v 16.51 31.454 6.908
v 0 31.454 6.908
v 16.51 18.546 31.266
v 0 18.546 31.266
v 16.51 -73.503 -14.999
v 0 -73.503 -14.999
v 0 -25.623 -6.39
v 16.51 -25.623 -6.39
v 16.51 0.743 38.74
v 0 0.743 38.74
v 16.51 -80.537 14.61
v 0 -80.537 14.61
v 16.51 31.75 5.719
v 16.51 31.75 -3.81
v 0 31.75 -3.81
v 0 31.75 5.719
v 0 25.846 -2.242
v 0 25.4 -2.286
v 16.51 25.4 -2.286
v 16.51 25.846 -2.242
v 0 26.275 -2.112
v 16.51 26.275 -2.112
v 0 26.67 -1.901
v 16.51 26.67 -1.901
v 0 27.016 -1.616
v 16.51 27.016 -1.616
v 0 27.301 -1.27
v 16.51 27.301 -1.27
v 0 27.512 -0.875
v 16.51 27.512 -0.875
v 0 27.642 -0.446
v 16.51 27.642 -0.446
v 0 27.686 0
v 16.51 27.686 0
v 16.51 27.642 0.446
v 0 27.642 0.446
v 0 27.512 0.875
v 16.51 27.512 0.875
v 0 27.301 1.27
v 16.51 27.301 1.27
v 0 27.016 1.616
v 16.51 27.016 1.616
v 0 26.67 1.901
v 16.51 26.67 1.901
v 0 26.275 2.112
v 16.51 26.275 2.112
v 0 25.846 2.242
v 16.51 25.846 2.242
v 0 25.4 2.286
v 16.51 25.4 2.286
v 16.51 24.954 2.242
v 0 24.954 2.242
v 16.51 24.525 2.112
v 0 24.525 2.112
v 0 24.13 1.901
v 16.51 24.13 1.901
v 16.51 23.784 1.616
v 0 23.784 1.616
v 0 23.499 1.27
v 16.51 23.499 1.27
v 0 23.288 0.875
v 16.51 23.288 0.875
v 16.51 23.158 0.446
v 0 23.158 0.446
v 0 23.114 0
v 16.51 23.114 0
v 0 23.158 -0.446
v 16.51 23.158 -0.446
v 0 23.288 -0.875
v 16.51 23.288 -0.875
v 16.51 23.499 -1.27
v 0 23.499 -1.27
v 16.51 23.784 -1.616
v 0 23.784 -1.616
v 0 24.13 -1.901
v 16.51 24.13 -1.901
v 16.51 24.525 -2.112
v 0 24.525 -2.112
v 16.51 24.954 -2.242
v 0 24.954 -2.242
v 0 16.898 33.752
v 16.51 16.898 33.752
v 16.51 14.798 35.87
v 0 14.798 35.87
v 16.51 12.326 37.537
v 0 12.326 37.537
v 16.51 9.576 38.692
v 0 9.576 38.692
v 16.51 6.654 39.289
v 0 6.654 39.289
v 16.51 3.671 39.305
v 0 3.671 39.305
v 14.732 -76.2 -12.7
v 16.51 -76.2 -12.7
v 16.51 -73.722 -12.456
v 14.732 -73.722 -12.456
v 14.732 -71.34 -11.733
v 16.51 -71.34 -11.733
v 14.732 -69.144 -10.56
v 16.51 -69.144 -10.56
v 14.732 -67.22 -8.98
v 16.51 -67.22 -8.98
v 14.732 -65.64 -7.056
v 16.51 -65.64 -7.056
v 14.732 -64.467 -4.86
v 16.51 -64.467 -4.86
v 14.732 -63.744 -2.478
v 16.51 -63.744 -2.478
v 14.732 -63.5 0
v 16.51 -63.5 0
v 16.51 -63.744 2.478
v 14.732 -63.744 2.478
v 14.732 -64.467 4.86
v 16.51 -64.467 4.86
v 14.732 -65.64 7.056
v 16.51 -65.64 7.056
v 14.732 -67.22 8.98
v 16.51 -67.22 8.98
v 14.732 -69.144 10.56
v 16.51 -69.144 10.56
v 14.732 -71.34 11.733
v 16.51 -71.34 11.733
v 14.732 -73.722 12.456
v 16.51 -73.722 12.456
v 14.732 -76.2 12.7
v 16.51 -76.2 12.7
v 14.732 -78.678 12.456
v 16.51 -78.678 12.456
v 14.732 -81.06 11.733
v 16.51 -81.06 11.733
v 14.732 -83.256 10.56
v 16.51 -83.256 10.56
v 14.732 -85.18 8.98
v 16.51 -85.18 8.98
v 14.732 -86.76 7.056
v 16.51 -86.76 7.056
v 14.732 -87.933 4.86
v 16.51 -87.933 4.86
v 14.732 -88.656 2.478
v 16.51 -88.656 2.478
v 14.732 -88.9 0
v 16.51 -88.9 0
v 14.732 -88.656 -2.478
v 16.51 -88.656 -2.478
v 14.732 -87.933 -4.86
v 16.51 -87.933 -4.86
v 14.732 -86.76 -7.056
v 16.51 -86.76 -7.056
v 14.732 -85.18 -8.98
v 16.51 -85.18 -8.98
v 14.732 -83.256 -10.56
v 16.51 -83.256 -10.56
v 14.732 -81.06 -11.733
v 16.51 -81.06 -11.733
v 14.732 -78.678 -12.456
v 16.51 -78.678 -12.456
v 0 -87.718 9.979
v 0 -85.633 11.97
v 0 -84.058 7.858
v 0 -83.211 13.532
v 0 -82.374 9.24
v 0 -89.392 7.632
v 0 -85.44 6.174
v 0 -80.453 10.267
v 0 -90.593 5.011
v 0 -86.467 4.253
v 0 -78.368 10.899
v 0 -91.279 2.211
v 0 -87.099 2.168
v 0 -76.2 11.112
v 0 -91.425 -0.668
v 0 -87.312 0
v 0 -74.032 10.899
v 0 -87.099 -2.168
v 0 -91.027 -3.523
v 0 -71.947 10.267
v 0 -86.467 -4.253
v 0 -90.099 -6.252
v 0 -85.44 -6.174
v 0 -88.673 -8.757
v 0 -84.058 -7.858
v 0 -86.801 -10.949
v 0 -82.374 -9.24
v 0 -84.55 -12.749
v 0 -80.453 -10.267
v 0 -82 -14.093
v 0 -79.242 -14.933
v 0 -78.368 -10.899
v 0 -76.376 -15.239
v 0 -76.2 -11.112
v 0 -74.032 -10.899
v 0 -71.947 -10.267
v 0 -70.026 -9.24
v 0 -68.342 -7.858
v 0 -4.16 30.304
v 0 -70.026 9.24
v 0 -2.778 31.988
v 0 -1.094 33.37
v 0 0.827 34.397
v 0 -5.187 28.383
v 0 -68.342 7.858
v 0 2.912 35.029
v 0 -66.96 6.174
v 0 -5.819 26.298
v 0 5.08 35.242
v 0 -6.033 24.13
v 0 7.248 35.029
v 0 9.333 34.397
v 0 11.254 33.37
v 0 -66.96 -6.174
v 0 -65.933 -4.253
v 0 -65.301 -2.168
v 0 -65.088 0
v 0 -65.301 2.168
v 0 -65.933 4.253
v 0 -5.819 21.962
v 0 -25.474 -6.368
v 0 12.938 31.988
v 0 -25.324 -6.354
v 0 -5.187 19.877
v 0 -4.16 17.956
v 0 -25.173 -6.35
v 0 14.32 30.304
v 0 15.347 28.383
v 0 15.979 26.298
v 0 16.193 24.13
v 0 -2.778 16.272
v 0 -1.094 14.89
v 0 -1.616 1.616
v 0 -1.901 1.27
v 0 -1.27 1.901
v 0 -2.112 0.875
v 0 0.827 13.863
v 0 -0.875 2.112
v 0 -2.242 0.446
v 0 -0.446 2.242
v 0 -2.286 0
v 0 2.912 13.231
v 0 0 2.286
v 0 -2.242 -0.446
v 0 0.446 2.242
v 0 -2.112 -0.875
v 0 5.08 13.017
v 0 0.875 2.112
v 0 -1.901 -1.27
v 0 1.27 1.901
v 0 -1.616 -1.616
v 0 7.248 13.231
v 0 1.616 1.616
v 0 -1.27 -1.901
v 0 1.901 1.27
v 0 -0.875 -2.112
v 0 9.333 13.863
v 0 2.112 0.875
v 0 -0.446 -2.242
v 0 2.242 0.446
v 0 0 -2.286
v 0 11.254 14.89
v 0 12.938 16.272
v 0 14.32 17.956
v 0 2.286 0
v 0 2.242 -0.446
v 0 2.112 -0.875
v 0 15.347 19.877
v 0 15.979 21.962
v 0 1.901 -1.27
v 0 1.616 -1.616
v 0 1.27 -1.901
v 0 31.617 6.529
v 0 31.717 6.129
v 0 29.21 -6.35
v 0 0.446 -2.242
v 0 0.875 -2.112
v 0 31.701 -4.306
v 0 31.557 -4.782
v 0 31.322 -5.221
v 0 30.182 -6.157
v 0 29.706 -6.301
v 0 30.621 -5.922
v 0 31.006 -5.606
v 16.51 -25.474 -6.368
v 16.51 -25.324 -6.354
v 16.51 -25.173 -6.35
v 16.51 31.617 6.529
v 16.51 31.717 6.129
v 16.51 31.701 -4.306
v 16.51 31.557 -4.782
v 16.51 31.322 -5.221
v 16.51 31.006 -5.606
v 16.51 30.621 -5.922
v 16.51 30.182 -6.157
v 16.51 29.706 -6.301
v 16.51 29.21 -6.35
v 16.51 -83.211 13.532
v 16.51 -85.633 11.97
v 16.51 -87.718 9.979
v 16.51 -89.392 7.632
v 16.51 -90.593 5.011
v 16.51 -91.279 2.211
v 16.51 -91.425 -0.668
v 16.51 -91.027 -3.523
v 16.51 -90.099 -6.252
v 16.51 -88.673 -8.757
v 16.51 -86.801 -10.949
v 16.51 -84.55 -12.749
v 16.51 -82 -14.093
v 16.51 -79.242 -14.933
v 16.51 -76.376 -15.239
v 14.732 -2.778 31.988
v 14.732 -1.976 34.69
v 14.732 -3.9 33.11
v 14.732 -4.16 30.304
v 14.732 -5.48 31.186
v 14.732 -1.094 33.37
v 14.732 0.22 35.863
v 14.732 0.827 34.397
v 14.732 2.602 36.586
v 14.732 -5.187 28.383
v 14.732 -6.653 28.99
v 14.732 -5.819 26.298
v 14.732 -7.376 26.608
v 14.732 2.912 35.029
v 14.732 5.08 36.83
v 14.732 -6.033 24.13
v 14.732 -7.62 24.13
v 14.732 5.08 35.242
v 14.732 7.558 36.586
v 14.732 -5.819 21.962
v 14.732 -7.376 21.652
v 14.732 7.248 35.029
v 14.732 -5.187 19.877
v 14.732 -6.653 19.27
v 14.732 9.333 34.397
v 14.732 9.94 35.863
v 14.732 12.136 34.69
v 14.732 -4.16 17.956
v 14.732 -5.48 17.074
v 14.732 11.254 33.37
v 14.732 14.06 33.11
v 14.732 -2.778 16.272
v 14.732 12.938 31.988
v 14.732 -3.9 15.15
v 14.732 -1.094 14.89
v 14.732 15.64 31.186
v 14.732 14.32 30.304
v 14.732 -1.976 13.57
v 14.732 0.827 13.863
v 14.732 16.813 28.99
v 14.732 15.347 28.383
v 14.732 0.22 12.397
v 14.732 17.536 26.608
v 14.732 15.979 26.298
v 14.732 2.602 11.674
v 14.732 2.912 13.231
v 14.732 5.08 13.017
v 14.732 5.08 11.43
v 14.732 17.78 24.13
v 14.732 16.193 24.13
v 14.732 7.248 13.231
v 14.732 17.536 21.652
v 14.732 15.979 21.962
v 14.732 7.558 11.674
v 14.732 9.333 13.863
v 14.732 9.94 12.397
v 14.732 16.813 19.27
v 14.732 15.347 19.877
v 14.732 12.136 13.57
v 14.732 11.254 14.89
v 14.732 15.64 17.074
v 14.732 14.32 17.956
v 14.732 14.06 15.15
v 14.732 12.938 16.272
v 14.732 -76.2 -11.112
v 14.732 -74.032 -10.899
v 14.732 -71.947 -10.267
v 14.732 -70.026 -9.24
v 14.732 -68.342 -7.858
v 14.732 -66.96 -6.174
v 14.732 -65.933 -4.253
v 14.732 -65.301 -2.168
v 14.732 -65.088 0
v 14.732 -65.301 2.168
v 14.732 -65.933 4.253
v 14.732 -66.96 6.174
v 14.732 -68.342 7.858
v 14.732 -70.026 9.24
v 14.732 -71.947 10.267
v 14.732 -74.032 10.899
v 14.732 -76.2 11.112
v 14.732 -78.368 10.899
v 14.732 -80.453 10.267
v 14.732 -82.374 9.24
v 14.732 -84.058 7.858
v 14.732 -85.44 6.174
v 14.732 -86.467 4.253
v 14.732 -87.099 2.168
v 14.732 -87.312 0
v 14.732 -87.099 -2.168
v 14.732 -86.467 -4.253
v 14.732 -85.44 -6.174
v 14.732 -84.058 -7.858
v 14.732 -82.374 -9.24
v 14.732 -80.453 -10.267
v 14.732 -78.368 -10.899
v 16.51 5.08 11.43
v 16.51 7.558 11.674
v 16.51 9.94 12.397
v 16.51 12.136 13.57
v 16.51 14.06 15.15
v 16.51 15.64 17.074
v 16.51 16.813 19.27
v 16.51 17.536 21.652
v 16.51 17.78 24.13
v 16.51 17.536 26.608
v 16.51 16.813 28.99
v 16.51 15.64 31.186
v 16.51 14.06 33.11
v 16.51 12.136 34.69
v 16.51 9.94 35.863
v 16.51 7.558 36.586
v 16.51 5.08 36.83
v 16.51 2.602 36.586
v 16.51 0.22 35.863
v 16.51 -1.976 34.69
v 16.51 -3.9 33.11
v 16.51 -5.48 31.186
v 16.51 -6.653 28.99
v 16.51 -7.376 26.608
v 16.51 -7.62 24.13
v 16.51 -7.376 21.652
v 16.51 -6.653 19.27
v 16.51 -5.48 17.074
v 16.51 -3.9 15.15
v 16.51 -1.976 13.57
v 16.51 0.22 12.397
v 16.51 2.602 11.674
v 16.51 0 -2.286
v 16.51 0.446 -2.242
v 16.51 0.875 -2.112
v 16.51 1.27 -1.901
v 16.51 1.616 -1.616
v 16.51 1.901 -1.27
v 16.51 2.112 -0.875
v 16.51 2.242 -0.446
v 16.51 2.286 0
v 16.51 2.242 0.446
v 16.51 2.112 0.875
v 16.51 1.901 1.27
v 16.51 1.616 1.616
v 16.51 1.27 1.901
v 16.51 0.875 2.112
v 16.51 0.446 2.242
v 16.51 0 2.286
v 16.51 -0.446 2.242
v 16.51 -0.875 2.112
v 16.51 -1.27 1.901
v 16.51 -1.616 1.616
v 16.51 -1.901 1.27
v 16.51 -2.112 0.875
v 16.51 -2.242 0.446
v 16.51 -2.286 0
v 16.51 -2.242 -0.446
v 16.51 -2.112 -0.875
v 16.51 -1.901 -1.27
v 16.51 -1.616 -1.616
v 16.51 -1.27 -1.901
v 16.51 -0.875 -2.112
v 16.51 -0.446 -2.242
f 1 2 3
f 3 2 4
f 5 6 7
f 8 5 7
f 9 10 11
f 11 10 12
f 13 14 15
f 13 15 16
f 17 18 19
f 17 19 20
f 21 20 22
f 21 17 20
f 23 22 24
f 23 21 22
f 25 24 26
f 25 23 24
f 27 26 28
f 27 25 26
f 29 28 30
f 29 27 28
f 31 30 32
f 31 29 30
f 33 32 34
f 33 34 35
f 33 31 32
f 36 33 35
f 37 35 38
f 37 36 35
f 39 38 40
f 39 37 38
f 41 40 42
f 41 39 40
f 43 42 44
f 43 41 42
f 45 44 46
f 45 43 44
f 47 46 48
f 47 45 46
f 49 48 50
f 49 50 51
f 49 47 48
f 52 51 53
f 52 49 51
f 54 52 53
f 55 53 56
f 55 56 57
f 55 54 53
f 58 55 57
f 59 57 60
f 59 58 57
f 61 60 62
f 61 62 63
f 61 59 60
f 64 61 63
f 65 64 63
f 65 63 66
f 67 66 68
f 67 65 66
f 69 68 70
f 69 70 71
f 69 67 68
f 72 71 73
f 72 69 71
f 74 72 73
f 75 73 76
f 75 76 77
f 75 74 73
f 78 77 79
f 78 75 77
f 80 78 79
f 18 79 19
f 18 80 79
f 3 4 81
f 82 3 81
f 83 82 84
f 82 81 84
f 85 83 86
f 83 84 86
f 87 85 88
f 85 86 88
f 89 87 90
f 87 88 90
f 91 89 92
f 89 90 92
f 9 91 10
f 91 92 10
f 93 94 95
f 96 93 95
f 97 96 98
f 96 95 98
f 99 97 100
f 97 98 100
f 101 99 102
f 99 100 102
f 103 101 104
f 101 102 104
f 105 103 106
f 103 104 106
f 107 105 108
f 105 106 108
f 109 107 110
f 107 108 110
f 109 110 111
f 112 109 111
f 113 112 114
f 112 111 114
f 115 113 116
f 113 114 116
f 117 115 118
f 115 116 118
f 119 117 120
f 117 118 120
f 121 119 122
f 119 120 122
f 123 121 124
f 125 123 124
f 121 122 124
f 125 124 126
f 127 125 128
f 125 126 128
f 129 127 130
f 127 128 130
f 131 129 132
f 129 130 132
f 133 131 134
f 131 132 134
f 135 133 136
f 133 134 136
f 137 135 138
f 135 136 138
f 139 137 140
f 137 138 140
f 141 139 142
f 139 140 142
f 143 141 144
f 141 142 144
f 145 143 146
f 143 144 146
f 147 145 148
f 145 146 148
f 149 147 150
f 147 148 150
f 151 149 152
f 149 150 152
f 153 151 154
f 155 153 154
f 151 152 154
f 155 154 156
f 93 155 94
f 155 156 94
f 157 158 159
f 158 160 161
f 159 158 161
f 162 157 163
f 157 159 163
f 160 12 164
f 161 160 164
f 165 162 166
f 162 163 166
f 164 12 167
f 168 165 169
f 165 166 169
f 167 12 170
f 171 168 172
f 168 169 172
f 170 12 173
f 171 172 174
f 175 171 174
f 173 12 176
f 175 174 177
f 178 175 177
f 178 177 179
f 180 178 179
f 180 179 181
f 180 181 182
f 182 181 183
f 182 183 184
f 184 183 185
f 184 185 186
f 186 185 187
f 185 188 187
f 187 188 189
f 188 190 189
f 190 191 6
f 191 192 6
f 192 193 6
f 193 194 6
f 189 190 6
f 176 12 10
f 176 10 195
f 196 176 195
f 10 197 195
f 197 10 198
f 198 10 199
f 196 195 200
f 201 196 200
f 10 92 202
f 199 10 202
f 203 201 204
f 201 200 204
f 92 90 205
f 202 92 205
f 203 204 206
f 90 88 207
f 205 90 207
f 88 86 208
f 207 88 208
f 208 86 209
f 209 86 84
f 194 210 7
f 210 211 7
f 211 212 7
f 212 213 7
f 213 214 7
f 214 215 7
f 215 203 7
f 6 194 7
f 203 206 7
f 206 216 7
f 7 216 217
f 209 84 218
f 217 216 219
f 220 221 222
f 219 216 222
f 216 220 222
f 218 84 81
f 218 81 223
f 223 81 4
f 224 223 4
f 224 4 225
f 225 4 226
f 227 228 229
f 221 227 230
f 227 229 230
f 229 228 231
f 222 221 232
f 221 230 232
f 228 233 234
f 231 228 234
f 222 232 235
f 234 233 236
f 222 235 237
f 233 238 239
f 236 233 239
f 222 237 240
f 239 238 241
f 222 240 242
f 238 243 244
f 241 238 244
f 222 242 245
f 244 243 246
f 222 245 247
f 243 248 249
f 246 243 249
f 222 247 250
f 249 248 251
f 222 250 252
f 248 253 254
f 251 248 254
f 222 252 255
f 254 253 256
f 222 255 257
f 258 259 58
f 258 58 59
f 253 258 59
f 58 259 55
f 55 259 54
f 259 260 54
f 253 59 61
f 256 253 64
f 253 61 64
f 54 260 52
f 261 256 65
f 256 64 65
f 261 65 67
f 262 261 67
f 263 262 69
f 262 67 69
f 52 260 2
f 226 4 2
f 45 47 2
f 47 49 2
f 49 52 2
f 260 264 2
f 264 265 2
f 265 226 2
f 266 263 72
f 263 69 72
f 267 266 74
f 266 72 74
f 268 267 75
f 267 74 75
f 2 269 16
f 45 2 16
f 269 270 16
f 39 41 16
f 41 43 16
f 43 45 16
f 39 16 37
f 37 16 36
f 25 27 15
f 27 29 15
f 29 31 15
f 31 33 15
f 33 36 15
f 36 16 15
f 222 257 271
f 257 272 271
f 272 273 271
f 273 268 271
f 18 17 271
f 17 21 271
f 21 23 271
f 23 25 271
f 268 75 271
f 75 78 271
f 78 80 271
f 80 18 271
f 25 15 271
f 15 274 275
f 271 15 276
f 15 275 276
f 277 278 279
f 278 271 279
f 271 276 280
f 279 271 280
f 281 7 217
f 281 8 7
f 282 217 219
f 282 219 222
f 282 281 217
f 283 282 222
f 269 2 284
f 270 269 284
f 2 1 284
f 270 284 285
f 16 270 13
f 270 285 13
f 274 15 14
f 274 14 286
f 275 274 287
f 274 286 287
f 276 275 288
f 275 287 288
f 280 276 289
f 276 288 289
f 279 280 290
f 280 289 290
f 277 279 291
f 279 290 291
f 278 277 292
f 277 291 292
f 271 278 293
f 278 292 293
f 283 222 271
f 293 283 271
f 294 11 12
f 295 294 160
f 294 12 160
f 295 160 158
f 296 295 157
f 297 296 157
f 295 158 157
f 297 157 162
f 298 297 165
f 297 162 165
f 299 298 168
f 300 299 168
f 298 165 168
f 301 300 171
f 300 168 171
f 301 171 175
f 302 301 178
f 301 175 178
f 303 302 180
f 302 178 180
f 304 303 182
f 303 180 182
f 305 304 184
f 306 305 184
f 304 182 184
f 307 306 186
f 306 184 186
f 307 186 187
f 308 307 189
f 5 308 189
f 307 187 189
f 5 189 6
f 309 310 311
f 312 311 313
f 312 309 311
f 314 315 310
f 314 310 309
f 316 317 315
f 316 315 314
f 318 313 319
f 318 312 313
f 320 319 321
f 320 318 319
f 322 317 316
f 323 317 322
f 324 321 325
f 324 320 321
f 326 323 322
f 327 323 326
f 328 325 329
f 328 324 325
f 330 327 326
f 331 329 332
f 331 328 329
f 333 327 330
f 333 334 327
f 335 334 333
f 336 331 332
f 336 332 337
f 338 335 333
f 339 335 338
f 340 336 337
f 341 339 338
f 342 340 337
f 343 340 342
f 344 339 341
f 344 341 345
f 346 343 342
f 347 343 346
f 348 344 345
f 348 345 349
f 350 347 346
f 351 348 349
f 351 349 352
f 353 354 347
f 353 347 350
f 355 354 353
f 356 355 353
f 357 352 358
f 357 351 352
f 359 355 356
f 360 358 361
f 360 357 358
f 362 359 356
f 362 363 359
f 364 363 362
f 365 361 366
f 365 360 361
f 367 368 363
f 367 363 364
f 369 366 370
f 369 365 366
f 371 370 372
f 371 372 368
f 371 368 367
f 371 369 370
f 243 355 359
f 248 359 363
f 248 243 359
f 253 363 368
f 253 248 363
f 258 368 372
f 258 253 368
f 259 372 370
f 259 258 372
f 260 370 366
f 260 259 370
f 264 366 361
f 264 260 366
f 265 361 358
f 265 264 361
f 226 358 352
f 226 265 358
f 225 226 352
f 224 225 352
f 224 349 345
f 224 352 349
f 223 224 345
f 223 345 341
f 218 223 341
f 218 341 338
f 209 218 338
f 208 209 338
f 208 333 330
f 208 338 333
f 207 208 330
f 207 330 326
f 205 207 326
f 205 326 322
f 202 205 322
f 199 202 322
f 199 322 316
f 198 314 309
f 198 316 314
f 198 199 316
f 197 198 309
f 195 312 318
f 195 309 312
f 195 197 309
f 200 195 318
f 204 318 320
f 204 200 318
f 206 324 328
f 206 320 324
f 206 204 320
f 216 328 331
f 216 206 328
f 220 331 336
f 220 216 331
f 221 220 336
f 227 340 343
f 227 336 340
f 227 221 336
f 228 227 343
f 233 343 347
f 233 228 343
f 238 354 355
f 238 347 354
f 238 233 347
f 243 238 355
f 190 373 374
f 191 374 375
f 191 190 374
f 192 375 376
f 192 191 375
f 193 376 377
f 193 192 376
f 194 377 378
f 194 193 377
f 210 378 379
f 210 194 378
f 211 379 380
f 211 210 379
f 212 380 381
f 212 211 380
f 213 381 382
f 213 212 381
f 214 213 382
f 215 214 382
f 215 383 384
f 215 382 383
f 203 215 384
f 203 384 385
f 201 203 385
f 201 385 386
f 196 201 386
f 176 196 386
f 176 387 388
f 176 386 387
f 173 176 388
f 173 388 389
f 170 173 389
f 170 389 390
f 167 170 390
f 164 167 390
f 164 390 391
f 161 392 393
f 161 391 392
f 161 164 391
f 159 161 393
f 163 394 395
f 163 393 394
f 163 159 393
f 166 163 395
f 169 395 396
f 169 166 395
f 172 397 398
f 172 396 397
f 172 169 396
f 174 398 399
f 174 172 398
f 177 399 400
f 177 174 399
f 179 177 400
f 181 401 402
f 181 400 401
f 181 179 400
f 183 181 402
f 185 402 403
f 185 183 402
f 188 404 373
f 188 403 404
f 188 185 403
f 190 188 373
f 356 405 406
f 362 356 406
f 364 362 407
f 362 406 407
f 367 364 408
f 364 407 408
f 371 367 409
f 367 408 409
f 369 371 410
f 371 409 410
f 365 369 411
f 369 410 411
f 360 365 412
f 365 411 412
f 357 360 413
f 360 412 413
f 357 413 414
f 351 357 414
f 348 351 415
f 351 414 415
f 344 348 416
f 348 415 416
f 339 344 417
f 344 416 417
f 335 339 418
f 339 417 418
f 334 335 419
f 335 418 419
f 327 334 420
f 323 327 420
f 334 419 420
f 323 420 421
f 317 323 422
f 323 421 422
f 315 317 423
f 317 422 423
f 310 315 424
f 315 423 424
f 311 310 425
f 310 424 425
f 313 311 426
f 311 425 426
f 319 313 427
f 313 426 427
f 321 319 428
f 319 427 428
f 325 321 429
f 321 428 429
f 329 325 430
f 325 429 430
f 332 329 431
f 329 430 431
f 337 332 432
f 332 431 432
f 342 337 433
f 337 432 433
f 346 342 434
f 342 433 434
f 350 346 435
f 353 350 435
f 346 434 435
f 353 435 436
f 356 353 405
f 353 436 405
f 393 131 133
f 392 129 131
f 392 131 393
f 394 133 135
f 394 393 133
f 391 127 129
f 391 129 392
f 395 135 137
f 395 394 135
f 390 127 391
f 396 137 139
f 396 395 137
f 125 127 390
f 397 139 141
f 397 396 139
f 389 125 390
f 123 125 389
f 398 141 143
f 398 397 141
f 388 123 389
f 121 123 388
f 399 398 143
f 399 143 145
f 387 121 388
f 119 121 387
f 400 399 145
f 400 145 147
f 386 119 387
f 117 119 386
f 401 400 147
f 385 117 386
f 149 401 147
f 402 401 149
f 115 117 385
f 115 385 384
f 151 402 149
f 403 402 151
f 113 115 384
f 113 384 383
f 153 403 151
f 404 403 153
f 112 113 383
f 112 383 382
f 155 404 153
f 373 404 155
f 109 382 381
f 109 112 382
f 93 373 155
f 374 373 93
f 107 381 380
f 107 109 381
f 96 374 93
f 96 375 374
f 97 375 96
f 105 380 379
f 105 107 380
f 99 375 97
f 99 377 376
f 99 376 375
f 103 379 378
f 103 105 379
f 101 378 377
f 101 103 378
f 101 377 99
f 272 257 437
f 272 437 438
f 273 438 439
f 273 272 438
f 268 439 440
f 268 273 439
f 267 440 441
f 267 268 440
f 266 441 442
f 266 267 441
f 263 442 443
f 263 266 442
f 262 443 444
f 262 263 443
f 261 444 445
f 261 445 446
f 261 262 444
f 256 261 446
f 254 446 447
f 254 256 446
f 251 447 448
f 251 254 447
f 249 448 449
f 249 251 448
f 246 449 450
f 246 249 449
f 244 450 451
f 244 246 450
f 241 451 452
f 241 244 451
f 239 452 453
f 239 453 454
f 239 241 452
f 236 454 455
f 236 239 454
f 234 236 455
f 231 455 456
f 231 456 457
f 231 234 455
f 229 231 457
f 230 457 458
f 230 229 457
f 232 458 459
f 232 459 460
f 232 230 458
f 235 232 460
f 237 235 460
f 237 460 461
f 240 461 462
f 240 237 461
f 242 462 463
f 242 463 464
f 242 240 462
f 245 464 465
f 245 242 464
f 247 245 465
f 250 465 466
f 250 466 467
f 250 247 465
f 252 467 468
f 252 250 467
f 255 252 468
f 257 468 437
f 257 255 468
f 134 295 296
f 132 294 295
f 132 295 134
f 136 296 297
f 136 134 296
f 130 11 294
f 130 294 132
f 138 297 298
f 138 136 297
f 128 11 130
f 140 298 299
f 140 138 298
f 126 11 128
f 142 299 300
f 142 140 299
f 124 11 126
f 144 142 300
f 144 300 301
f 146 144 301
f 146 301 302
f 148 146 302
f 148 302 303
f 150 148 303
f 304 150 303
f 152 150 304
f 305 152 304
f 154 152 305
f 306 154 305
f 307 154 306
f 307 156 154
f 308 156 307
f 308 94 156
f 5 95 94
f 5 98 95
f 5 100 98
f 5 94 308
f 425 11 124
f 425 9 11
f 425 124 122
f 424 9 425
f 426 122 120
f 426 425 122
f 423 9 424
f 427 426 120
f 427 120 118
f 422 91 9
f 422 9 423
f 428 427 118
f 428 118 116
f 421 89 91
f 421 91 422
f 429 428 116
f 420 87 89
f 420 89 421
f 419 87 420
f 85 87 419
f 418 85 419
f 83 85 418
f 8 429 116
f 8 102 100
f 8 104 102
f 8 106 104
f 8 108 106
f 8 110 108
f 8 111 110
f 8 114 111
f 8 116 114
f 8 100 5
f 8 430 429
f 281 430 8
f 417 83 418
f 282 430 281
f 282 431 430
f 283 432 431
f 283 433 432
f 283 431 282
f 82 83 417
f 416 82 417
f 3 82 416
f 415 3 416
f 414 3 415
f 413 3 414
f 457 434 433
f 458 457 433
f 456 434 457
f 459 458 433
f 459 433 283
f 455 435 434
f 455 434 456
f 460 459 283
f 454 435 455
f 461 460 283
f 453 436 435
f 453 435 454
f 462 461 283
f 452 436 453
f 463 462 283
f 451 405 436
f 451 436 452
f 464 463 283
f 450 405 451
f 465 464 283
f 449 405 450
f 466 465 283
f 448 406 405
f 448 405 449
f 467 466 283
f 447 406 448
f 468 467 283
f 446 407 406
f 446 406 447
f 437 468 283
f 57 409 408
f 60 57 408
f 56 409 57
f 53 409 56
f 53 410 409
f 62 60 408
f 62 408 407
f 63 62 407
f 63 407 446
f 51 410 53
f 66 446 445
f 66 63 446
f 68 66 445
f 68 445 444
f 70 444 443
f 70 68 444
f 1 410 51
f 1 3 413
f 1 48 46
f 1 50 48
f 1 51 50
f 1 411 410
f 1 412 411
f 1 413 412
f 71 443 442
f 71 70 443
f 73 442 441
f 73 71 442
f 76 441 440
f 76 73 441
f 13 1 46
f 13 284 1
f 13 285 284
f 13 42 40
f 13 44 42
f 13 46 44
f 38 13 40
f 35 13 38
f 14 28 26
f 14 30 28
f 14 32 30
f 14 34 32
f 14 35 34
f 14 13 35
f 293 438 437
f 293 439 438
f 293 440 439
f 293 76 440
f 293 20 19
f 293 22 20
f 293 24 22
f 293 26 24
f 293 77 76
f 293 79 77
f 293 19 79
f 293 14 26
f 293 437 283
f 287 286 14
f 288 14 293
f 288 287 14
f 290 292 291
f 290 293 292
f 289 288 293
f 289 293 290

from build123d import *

# Parameters (mm, degrees)
SKETCH1_R           = 2.286
SKETCH1_R_2         = 11.1125
BOSS_EXTRUDE1_DEPTH = 16.51
SKETCH2_R           = 12.7
CUT_EXTRUDE1_DEPTH  = 1.778
FILLET1_R           = 2.54


with BuildPart() as part:
    # Sketch1 → Boss-Extrude1 (new body)
    with BuildSketch(Plane(origin=(0, 0, 0), x_dir=(0, 0, -1), z_dir=(1, 0, 0))):
        with BuildLine():
            Line((-38.739778242, 0.742722084), (-14.609778242, -80.537277916))
            ThreePointArc((-14.609778242, -80.537277916), (3.522565818, -91.027310277), (14.999447267, -73.502930908))
            Line((14.999447267, -73.502930908), (6.35, -25.4))
            Line((6.35, -25.4), (6.35, 31.75))
            Line((6.35, 31.75), (-6.35, 31.75))
            Line((-6.35, 31.75), (-31.266140037, 18.54599812))
            ThreePointArc((-31.266140037, 18.54599812), (-38.182060342, 10.978915167), (-38.739778242, 0.742722084))
        make_face()
        Circle(SKETCH1_R, mode=Mode.SUBTRACT)
        with Locations((0, 25.4)):
            Circle(SKETCH1_R, mode=Mode.SUBTRACT)
        with Locations((0, -76.2)):
            Circle(SKETCH1_R_2, mode=Mode.SUBTRACT)
        with Locations((-24.13, 5.08)):
            Circle(SKETCH1_R_2, mode=Mode.SUBTRACT)
    extrude(amount=BOSS_EXTRUDE1_DEPTH)

    # Sketch2 → Cut-Extrude1 (cut)
    with BuildSketch(Plane(origin=(16.51, 0, 0), x_dir=(0, 0, -1), z_dir=(1, 0, 0))):
        with Locations((0, -76.2)):
            Circle(SKETCH2_R)
        with Locations((-24.13, 5.08)):
            Circle(SKETCH2_R)
    extrude(amount=-CUT_EXTRUDE1_DEPTH, mode=Mode.SUBTRACT)

    # Fillet1
    fillet1_edges = [part.edges().sort_by_distance(p)[0] for p in [
        (8.255, 31.75, 6.35),
        (8.255, 31.75, -6.35),
        (8.255, -25.4, -6.35),
    ]]
    fillet(fillet1_edges, radius=FILLET1_R)


solid = part.part
